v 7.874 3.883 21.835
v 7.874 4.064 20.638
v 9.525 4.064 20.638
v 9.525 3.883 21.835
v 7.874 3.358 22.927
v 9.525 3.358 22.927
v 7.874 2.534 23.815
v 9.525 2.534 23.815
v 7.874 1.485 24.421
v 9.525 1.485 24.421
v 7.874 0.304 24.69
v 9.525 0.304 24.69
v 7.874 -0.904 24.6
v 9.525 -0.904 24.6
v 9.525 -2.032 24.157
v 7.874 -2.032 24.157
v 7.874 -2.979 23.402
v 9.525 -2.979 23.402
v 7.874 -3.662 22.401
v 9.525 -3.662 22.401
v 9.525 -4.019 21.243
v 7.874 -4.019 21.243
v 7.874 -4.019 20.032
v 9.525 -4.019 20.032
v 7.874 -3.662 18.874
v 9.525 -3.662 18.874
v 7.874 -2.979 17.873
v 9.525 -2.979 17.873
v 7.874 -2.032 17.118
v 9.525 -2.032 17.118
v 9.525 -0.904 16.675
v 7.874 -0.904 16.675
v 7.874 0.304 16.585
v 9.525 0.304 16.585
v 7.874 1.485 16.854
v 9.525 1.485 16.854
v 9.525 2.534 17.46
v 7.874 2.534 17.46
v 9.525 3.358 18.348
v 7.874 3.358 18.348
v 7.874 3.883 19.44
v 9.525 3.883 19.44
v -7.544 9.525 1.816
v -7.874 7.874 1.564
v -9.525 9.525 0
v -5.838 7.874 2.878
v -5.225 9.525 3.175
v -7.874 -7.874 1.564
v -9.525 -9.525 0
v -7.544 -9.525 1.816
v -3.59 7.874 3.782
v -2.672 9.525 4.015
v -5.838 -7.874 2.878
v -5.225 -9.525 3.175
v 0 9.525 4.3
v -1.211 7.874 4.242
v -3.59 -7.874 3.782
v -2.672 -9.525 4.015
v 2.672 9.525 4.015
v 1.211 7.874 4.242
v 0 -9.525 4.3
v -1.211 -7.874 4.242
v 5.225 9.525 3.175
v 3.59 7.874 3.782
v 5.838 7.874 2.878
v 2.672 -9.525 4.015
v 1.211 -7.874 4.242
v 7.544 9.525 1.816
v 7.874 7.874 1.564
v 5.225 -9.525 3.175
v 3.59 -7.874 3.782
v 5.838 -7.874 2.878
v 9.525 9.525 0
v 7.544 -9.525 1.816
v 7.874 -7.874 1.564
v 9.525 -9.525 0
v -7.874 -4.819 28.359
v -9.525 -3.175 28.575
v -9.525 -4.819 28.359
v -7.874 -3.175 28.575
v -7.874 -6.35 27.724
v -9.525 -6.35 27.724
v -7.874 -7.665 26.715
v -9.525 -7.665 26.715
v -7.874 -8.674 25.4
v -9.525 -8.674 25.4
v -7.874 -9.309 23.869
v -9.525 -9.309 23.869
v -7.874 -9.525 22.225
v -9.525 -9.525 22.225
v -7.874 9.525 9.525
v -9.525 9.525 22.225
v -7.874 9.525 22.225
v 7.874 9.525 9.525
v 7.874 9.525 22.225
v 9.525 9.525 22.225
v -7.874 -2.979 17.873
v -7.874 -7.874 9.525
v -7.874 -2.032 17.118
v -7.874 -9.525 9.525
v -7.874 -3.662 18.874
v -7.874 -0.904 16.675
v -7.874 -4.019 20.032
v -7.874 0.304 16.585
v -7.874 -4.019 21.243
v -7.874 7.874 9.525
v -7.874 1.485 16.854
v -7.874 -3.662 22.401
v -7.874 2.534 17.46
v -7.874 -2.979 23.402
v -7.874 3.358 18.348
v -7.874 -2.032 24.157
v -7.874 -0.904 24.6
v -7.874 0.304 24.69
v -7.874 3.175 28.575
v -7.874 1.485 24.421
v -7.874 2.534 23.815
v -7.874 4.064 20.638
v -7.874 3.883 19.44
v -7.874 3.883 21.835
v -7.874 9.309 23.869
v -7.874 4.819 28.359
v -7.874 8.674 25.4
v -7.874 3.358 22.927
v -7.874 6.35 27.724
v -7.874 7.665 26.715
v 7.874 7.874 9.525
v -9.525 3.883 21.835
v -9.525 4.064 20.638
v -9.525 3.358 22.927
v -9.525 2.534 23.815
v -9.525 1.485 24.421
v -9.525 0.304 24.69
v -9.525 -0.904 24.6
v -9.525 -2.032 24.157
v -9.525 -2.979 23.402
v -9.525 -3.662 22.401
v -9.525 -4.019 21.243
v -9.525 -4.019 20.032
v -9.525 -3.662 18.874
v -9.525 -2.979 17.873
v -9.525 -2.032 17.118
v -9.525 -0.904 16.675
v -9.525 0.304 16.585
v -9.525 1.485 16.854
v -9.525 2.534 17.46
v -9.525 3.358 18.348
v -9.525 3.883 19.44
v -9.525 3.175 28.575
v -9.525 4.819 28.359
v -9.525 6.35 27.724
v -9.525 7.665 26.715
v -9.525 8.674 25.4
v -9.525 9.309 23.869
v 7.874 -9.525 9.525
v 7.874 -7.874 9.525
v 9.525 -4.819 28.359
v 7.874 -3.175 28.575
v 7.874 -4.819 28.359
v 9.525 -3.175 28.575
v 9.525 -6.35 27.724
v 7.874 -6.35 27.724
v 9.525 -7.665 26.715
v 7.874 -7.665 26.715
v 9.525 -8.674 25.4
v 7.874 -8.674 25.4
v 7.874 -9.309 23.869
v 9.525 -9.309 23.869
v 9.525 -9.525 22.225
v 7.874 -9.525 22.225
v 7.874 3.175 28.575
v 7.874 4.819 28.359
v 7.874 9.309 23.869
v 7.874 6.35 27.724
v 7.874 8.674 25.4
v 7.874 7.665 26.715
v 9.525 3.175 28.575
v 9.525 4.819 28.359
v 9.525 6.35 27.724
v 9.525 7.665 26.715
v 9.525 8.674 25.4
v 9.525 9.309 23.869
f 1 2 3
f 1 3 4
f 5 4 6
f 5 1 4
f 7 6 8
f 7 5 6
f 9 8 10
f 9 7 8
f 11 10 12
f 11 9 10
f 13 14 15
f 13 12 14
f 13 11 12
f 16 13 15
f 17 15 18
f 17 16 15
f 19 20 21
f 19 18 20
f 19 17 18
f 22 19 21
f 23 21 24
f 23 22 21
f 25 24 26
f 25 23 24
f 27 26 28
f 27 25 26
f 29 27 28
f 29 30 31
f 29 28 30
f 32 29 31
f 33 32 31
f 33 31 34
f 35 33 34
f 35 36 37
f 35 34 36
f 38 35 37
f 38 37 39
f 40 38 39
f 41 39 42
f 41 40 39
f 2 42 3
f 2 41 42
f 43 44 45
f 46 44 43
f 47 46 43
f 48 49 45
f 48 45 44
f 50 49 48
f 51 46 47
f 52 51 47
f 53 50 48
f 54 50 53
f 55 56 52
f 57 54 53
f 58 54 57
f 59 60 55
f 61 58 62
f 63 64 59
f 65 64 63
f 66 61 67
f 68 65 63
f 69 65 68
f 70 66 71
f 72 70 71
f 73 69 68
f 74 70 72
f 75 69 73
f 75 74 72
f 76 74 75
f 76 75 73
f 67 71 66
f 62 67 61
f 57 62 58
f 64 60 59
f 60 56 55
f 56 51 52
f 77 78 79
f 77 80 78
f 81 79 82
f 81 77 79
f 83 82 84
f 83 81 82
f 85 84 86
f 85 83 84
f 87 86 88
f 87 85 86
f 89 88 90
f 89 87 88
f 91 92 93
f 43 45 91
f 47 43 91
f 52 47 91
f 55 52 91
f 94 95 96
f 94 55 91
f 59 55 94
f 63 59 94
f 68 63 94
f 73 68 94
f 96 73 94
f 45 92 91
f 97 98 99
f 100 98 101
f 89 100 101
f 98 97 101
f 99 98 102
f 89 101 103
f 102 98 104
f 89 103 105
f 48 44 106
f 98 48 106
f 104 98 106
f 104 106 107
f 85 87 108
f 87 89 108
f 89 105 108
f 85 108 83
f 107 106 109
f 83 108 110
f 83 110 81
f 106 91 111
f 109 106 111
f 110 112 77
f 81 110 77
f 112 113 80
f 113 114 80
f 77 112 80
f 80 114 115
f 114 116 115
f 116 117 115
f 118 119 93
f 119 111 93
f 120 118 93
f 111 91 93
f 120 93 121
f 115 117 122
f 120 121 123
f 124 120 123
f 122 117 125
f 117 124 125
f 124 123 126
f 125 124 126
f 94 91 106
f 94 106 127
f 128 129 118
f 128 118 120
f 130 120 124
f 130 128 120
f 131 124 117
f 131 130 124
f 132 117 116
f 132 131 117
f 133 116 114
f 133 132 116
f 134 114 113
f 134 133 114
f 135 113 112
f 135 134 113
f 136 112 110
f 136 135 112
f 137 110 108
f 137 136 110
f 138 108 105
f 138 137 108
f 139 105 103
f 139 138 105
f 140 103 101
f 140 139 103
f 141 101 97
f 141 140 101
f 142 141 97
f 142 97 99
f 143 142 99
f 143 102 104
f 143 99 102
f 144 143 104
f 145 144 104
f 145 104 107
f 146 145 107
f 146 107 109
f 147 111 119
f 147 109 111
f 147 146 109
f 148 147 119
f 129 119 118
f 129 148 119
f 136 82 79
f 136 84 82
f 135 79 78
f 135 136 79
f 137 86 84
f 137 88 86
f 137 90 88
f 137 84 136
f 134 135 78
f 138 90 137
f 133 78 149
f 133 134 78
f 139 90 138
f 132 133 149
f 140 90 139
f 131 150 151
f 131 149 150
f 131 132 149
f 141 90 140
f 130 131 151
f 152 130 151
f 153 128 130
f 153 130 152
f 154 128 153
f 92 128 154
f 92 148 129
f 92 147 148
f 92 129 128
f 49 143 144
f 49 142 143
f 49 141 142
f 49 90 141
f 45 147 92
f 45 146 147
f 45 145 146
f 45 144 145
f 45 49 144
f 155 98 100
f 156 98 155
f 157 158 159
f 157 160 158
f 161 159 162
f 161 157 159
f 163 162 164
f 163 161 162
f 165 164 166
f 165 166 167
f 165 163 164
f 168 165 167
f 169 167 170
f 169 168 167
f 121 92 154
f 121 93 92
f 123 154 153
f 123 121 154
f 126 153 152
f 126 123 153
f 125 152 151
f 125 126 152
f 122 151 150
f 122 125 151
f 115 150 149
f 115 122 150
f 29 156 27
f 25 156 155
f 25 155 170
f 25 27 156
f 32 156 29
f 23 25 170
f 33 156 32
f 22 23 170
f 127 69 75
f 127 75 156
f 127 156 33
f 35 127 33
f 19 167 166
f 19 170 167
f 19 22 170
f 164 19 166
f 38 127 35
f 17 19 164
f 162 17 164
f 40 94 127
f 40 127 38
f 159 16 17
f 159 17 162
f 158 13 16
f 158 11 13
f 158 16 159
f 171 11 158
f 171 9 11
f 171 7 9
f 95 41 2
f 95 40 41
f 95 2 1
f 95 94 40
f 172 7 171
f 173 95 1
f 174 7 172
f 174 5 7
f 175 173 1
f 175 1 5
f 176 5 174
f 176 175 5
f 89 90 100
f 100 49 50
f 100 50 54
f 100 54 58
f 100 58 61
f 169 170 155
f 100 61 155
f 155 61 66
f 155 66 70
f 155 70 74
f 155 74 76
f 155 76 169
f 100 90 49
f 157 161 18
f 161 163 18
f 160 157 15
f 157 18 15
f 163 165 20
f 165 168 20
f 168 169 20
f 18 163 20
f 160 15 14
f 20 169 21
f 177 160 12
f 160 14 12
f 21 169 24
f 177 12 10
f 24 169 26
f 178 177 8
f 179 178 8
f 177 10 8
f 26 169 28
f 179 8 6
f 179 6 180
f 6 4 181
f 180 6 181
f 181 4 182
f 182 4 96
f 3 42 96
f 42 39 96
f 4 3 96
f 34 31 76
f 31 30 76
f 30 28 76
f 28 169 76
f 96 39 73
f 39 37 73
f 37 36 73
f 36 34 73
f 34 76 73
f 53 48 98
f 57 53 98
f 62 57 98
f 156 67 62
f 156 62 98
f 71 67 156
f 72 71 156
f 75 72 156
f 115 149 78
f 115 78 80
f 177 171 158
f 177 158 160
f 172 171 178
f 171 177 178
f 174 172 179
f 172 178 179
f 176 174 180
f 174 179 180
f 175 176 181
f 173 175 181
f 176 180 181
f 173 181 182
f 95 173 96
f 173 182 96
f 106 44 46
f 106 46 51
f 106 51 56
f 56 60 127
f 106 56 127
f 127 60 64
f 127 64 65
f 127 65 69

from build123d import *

# Parameters (mm, degrees)
SKETCH1_W               = 19.05
SKETCH1_H               = 19.05
SKETCH1_W_2             = 15.748
SKETCH1_H_2             = 15.748
BOSS_EXTRUDE1_DEPTH     = 28.575
CUT_EXTRUDE5_DEPTH      = 36.639286609
CUT_EXTRUDE5_DEPTH_BACK = 36.639286609
SKETCH5_R               = 12.7
CUT_EXTRUDE2_DEPTH      = 36.639286609
CUT_EXTRUDE2_DEPTH_BACK = 36.639286609
SKETCH3_R               = 4.064
CUT_EXTRUDE4_DEPTH      = 36.639286609
CUT_EXTRUDE4_DEPTH_BACK = 36.639286609
SKETCH4_W               = 15.748
SKETCH4_H               = 19.05
FILLET2_R               = 6.35


with BuildPart() as part:
    # Sketch1 → Boss-Extrude1 (new body)
    with BuildSketch(Plane.XY):
        Rectangle(SKETCH1_W, SKETCH1_H)
        Rectangle(SKETCH1_W_2, SKETCH1_H_2, mode=Mode.SUBTRACT)
    extrude(amount=BOSS_EXTRUDE1_DEPTH)

    # Sketch5 → Cut-Extrude5 (cut, two sides: drawn at the far end of the back side and taken through both)
    with BuildSketch(Plane(origin=(0, 9.525, 0), x_dir=(1, 0, 0), z_dir=(0, 1, 0)).offset(-CUT_EXTRUDE5_DEPTH_BACK)):
        with Locations((0, 8.400260413)):
            Circle(SKETCH5_R)
    extrude(amount=CUT_EXTRUDE5_DEPTH + CUT_EXTRUDE5_DEPTH_BACK, mode=Mode.SUBTRACT)

    # Sketch3 → Cut-Extrude2 (cut, two sides: drawn at the far end of the back side and taken through both)
    with BuildSketch(Plane(origin=(9.525, 0, 0), x_dir=(0, 0, -1), z_dir=(1, 0, 0)).offset(-CUT_EXTRUDE2_DEPTH_BACK)):
        with Locations((-20.6375, 0)):
            Circle(SKETCH3_R)
    extrude(amount=CUT_EXTRUDE2_DEPTH + CUT_EXTRUDE2_DEPTH_BACK, mode=Mode.SUBTRACT)

    # Sketch4 → Cut-Extrude4 (cut, two sides: drawn at the far end of the back side and taken through both)
    with BuildSketch(Plane.XZ.offset(9.525).offset(-CUT_EXTRUDE4_DEPTH_BACK)):
        with Locations((0, 19.05)):
            Rectangle(SKETCH4_W, SKETCH4_H)
    extrude(amount=CUT_EXTRUDE4_DEPTH + CUT_EXTRUDE4_DEPTH_BACK, mode=Mode.SUBTRACT)

    # Fillet2
    fillet2_edges = [part.edges().sort_by_distance(p)[0] for p in [
        (-8.6995, 9.525, 28.575),
        (8.6995, 9.525, 28.575),
        (-8.6995, -9.525, 28.575),
        (8.6995, -9.525, 28.575),
    ]]
    fillet(fillet2_edges, radius=FILLET2_R)


solid = part.part
